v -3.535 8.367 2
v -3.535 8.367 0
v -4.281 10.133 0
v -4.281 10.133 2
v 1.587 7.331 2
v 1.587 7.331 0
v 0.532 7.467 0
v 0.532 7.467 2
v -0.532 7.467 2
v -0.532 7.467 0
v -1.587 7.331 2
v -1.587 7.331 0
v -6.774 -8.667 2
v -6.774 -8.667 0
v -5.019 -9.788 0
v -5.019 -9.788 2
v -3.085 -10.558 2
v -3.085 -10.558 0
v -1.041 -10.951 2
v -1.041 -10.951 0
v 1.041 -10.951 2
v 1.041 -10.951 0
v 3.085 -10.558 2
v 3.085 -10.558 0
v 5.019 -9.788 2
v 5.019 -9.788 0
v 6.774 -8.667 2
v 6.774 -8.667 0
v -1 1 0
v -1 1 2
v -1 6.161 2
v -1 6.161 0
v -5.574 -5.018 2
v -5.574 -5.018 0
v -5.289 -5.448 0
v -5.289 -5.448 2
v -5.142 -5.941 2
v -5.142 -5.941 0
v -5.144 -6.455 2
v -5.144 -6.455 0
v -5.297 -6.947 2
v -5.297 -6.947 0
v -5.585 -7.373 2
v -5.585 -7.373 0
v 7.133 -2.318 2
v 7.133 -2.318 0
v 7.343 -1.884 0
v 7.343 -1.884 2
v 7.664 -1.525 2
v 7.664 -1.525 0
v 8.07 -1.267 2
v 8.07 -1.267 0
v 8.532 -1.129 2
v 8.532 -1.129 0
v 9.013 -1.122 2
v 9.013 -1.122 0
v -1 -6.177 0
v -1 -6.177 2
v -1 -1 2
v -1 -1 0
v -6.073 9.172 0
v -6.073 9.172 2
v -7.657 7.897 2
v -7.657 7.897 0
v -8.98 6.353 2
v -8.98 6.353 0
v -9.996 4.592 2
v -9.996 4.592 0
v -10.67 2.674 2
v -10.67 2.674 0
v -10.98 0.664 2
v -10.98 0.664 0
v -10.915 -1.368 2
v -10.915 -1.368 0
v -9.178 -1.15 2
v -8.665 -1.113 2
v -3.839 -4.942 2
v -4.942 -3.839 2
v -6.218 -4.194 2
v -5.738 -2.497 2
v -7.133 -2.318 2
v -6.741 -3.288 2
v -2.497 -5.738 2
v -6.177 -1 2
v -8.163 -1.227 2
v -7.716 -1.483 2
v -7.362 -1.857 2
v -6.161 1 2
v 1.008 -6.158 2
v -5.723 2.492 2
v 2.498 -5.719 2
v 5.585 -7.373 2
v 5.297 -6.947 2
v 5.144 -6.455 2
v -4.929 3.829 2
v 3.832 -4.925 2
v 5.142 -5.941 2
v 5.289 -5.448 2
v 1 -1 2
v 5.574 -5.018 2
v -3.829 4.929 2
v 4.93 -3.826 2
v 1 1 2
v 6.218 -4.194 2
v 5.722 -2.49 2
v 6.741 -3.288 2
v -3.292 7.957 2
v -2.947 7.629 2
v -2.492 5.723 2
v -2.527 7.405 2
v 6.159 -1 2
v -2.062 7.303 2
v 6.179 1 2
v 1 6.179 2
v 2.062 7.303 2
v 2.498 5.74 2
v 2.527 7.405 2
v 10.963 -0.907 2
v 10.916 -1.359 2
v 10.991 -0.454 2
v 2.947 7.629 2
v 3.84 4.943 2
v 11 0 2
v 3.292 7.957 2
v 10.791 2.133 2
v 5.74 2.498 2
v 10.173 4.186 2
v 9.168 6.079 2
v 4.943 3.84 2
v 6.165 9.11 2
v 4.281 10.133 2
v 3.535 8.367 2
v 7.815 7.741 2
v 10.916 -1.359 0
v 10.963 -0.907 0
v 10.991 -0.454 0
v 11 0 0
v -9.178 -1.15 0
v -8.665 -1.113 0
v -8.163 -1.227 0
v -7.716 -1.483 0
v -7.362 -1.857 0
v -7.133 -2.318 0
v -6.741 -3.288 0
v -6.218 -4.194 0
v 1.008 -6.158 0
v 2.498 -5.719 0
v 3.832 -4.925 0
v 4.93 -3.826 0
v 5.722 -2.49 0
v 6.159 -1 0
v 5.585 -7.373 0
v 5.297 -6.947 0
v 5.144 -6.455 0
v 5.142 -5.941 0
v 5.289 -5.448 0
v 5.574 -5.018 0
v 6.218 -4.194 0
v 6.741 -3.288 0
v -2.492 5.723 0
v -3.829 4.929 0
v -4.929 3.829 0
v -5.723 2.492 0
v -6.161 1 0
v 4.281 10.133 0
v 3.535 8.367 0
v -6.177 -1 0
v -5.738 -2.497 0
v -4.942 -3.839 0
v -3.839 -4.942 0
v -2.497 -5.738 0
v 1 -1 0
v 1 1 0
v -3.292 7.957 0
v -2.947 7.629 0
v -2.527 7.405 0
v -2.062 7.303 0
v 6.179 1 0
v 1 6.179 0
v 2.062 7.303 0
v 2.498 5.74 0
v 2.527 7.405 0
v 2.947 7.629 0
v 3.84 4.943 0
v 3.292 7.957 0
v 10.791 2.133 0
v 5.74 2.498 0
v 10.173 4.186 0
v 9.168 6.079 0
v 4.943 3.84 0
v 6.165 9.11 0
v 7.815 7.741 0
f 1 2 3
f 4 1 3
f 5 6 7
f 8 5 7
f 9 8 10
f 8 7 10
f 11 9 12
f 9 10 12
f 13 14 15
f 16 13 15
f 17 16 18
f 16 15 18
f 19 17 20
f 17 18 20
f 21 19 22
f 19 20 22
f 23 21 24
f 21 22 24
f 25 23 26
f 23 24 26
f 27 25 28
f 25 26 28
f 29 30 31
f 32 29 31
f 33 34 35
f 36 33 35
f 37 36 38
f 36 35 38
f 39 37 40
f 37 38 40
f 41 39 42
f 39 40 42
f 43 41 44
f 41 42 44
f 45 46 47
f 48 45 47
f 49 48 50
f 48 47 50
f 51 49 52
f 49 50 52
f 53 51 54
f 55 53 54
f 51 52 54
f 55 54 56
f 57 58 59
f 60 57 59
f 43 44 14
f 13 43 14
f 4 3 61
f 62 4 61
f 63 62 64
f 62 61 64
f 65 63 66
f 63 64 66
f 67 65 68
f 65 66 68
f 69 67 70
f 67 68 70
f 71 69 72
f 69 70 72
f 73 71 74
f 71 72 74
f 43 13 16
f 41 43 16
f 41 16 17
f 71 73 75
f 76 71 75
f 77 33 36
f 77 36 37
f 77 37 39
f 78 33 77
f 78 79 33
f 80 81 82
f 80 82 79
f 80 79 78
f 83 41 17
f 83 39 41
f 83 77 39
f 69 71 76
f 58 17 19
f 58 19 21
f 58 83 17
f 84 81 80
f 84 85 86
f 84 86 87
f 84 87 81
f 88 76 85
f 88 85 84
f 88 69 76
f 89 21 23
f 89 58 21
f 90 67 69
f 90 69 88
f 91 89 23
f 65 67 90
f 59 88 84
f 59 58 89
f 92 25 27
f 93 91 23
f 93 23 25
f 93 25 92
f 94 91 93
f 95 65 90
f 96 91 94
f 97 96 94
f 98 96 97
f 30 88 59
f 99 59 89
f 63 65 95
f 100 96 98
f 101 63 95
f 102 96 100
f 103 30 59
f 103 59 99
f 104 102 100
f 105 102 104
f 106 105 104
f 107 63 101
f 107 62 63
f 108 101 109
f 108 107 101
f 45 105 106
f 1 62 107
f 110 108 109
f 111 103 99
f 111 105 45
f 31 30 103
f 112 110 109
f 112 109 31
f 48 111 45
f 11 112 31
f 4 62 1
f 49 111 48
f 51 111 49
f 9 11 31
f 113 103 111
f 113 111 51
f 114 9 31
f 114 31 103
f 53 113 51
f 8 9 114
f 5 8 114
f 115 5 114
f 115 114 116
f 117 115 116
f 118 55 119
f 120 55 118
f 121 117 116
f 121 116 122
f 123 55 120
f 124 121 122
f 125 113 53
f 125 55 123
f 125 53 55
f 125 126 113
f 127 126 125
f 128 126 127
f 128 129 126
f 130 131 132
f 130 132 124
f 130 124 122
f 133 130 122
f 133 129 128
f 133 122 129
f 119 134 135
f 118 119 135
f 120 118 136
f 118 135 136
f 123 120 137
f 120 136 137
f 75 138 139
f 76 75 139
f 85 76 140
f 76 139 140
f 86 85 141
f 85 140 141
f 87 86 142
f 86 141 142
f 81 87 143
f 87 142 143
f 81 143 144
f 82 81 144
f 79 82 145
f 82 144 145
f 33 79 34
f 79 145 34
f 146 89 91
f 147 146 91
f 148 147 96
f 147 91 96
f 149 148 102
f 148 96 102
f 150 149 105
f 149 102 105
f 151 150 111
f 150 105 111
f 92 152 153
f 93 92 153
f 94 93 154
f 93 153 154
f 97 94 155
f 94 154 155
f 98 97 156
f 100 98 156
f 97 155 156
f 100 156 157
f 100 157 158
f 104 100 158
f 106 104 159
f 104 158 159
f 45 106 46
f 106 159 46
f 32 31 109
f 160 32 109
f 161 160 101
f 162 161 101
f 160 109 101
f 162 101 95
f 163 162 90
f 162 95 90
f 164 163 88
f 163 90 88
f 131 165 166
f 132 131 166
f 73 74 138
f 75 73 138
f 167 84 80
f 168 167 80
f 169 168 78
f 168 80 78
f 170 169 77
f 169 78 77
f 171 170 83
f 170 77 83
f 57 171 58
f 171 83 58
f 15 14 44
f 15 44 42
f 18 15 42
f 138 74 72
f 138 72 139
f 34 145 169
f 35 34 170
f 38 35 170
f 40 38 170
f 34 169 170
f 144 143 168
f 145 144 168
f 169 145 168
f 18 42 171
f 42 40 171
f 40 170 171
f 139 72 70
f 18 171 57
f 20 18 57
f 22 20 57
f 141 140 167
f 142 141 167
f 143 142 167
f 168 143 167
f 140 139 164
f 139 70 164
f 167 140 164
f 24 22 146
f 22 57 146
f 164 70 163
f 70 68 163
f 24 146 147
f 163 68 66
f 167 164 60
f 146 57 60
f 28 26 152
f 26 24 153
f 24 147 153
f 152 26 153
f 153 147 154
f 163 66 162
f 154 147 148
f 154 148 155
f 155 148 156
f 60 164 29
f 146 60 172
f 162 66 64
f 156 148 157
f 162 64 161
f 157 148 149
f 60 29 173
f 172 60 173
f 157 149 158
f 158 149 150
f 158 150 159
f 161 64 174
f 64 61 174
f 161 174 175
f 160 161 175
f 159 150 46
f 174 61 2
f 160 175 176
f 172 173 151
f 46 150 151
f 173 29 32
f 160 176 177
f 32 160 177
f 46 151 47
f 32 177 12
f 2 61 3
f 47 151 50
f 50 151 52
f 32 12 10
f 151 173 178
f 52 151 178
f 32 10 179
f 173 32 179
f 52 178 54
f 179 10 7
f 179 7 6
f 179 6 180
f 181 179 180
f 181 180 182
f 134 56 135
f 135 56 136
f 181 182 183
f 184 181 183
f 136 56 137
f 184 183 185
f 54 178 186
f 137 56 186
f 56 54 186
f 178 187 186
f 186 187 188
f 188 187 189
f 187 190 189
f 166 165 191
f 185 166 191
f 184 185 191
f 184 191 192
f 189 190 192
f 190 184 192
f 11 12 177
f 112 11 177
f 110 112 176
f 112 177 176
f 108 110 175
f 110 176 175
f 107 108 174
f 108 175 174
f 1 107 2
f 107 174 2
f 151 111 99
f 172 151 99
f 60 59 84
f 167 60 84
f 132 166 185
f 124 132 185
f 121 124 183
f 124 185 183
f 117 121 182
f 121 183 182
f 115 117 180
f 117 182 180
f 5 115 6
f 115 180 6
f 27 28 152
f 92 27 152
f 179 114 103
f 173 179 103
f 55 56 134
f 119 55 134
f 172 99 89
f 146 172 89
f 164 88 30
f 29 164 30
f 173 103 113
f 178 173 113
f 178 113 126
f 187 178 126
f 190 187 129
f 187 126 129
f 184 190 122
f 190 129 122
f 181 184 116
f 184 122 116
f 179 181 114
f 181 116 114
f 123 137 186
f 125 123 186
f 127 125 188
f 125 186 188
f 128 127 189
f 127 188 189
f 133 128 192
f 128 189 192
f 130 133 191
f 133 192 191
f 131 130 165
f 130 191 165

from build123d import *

# Parameters (mm, degrees)
F1_DEPTH = 2
F3_DEPTH = 25


with BuildPart() as f1:
    # F0 (on Top) → F1 (new body)
    with BuildSketch(Plane.XY):
        with BuildLine():
            Line((4.281331, 10.132631), (3.535193, 8.366744))
            ThreePointArc((3.535193, 8.366744), (2.744845, 7.502753), (1.586626, 7.330533))
            ThreePointArc((1.586626, 7.330533), (0, 7.484539), (-1.586626, 7.330533))
            ThreePointArc((-1.586626, 7.330533), (-2.744845, 7.502753), (-3.535193, 8.366744))
            Line((-3.535193, 8.366744), (-4.281331, 10.132631))
            ThreePointArc((-4.281331, 10.132631), (-9.528654, 5.495885), (-10.914603, -1.368004))
            Line((-10.914603, -1.368004), (-9.178189, -1.150367))
            ThreePointArc((-9.178189, -1.150367), (-7.929849, -1.338514), (-7.132924, -2.317627))
            ThreePointArc((-7.132924, -2.317627), (-6.495191, -3.75), (-5.573586, -5.01848))
            ThreePointArc((-5.573586, -5.01848), (-5.124111, -6.198194), (-5.585341, -7.373362))
            Line((-5.585341, -7.373362), (-6.773725, -8.666986))
            ThreePointArc((-6.773725, -8.666986), (0, -11), (6.773725, -8.666986))
            Line((6.773725, -8.666986), (5.585341, -7.373362))
            ThreePointArc((5.585341, -7.373362), (5.124111, -6.198194), (5.573586, -5.01848))
            ThreePointArc((5.573586, -5.01848), (6.495191, -3.75), (7.132924, -2.317627))
            ThreePointArc((7.132924, -2.317627), (7.858216, -1.381697), (9.01341, -1.121806))
            Line((9.01341, -1.121806), (10.915781, -1.358574))
            ThreePointArc((10.915781, -1.358574), (10.978925, -0.680591), (11, 0))
            ThreePointArc((11, 0), (9.167733, 6.078872), (4.281331, 10.132631))
        make_face()
    extrude(amount=F1_DEPTH)

    # F2 (on face) → F3 (cut)
    with BuildSketch(Plane.XY.offset(2)):
        with BuildLine():
            ThreePointArc((1.572898, 7.333212), (0, 7.5), (-1.572898, 7.333212))
            ThreePointArc((-1.572898, 7.333212), (0, 7.484539), (1.572898, 7.333212))
        make_face()
        with BuildLine():
            Line((-1, 1), (-1, 6.161259))
            ThreePointArc((-1, 6.161259), (-4.413678, 4.413678), (-6.161259, 1))
            Line((-6.161259, 1), (-1, 1))
        make_face()
        with BuildLine():
            ThreePointArc((6.179031, 1), (4.426083, 4.426083), (1, 6.179031))
            Line((1, 6.179031), (1, 1))
            Line((1, 1), (6.179031, 1))
        make_face()
        with BuildLine():
            ThreePointArc((1.008042, -6.158178), (4.415323, -4.409561), (6.159489, -1))
            Line((6.159489, -1), (1, -1))
            Line((1, -1), (1.008042, -6.158178))
        make_face()
        with BuildLine():
            Line((-1, -1), (-6.177082, -1))
            ThreePointArc((-6.177082, -1), (-4.424723, -4.424723), (-1, -6.177082))
            Line((-1, -6.177082), (-1, -1))
        make_face()
    extrude(amount=-F3_DEPTH, mode=Mode.SUBTRACT)


solid = f1.part
